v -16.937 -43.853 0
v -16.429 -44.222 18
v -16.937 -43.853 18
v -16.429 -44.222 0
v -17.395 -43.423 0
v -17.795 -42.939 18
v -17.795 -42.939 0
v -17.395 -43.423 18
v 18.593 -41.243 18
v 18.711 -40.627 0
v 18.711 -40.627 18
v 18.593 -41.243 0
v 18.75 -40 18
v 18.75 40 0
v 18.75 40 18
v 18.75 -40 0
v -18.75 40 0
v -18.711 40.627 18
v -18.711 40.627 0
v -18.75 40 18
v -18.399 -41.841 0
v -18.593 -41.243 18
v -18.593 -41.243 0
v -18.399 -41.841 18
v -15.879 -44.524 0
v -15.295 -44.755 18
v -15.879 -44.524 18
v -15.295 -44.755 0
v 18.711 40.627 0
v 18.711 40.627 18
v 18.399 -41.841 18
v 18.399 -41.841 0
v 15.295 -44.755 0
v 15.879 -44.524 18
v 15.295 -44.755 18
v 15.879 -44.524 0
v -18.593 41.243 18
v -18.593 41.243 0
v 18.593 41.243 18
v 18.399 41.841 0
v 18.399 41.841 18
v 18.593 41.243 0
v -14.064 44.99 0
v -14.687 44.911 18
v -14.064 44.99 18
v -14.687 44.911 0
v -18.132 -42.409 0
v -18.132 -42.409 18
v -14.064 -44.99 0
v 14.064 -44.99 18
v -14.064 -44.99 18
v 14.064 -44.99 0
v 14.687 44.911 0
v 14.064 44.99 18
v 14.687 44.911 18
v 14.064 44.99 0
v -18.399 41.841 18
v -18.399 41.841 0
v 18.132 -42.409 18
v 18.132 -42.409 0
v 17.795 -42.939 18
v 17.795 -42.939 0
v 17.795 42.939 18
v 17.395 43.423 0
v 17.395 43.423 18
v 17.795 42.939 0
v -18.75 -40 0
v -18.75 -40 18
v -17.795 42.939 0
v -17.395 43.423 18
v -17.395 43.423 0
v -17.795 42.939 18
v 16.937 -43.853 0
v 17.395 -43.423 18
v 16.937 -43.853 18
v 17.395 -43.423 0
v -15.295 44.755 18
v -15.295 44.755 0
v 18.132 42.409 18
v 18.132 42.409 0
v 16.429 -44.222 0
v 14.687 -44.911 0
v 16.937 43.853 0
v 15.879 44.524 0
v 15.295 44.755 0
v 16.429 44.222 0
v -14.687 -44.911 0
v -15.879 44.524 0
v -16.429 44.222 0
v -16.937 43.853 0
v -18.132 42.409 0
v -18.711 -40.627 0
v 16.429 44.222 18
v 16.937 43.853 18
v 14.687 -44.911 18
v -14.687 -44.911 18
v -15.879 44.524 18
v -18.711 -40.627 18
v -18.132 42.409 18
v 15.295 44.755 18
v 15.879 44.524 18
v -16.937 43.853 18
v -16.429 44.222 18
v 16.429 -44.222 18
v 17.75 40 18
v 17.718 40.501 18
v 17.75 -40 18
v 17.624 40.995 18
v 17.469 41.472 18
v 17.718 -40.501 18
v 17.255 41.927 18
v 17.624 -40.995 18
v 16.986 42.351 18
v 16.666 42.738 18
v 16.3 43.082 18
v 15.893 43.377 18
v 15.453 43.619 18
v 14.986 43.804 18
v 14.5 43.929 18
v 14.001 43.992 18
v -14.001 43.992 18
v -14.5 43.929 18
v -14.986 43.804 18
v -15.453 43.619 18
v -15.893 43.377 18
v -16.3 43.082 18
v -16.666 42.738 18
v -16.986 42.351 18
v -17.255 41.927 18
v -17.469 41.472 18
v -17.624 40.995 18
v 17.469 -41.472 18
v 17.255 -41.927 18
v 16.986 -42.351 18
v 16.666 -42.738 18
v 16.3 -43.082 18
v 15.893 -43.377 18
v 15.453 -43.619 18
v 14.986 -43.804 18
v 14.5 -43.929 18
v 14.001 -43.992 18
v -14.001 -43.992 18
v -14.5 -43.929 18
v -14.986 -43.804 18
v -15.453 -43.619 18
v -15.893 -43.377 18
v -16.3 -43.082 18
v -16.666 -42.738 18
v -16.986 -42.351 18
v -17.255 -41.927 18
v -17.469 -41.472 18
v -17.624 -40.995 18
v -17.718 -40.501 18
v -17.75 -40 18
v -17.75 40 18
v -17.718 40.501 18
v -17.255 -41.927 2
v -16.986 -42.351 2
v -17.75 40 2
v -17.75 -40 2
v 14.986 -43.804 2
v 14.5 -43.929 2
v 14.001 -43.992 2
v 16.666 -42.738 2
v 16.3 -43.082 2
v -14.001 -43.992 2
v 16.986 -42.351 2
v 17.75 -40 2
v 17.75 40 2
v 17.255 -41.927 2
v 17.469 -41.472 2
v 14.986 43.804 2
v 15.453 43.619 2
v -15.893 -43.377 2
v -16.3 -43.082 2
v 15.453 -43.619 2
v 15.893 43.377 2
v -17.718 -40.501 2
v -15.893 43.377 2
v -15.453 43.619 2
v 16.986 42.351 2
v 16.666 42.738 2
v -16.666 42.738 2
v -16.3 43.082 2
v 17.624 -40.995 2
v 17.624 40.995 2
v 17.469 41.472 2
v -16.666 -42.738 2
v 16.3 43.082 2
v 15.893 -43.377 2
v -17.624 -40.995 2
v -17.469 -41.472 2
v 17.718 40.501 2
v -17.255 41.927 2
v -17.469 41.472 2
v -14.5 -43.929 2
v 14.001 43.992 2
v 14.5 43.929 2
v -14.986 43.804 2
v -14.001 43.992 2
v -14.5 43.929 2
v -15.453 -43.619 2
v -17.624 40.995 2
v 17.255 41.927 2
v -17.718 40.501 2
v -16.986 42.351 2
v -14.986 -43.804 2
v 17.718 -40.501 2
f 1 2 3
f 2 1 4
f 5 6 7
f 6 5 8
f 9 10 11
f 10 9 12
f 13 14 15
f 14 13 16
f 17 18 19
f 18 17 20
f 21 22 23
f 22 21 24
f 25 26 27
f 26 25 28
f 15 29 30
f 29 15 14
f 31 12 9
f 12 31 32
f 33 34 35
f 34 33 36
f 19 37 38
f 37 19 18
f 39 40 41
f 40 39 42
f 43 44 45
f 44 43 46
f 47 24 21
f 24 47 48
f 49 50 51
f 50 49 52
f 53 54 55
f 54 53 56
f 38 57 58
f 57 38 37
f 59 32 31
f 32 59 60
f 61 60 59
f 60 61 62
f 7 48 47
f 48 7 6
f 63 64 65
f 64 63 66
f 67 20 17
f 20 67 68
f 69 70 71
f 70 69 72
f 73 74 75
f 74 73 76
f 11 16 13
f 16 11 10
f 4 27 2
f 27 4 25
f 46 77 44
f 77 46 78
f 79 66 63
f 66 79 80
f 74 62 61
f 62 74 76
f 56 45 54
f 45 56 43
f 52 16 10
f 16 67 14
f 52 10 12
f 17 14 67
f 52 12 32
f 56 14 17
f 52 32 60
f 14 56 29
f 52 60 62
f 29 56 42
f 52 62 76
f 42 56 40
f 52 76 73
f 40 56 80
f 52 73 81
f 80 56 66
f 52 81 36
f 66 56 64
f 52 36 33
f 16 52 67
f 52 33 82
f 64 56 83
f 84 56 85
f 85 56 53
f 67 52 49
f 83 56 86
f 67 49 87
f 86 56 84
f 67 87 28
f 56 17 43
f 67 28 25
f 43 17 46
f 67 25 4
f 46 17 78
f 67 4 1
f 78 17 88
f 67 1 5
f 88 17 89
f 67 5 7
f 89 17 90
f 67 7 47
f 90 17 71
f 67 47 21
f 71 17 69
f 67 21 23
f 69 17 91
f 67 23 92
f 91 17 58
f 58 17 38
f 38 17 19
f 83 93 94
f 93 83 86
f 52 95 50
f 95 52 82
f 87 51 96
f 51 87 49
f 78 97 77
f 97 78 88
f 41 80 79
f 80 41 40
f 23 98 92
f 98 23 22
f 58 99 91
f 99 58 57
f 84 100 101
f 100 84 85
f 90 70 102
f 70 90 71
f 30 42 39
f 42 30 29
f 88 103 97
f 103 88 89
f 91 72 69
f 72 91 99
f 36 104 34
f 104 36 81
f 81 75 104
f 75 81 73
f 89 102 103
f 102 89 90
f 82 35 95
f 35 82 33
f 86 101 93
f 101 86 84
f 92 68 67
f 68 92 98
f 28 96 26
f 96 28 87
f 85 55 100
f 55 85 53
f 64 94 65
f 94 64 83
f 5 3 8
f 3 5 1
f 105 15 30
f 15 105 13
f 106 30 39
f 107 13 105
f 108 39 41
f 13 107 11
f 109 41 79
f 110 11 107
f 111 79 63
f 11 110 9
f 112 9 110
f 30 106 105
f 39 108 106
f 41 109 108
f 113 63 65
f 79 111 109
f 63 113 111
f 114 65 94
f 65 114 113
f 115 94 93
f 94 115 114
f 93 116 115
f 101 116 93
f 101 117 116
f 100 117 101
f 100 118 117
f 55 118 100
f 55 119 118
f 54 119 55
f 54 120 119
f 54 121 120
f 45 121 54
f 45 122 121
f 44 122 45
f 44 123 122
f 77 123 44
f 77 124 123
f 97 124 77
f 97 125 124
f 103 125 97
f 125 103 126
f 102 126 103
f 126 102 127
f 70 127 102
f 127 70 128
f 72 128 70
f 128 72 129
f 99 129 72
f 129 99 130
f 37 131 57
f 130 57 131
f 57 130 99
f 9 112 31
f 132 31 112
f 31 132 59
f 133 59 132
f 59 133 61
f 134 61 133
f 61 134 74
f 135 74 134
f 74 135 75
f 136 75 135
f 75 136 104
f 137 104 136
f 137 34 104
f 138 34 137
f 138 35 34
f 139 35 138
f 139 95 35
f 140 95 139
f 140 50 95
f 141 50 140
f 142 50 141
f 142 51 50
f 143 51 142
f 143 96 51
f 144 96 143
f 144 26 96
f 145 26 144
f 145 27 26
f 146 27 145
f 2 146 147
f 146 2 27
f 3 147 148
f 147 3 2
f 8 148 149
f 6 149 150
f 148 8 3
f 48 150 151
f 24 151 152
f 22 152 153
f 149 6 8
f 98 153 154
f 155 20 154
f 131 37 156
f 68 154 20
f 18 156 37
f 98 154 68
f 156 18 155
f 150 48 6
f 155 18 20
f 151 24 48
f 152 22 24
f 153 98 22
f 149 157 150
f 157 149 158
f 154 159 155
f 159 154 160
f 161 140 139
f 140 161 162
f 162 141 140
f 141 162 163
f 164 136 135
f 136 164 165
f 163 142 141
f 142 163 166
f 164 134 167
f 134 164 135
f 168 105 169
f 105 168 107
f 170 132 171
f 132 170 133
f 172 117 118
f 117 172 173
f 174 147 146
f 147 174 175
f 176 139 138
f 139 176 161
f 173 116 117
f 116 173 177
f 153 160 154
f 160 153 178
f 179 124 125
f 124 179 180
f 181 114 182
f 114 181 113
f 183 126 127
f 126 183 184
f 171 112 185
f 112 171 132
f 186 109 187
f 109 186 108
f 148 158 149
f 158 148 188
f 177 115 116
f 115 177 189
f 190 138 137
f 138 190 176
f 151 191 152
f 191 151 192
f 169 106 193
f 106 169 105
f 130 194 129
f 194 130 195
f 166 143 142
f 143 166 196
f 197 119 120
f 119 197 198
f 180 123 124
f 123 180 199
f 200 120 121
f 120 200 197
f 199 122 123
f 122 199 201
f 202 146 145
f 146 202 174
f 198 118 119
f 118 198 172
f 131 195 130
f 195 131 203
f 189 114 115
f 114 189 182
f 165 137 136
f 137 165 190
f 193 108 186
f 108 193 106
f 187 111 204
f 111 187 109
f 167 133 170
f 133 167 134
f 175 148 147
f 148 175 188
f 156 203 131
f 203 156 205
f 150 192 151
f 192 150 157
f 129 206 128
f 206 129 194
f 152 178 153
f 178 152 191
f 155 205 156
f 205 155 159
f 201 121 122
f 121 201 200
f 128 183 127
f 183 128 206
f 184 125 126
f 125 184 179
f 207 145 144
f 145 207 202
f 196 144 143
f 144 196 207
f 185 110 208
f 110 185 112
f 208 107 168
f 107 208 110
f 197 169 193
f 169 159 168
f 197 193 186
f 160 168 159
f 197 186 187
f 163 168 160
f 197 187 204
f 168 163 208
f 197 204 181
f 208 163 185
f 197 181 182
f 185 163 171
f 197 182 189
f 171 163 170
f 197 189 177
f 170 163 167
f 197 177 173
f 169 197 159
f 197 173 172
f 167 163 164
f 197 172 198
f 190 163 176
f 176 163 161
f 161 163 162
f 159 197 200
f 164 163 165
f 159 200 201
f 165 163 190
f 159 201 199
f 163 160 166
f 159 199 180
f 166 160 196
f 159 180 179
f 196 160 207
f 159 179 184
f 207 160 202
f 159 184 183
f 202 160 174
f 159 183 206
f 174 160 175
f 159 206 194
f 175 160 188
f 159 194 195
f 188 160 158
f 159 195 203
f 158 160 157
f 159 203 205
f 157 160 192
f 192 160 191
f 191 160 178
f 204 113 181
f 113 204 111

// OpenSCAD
$fn = 50;


difference() {
	union() {
		hull() {
			translate(v = [-13.7500000000, 40.0000000000, 0]) {
				cylinder(h = 18, r = 5);
			}
			translate(v = [13.7500000000, 40.0000000000, 0]) {
				cylinder(h = 18, r = 5);
			}
			translate(v = [-13.7500000000, -40.0000000000, 0]) {
				cylinder(h = 18, r = 5);
			}
			translate(v = [13.7500000000, -40.0000000000, 0]) {
				cylinder(h = 18, r = 5);
			}
		}
	}
	union() {
		translate(v = [0, 0, 2]) {
			hull() {
				translate(v = [-13.7500000000, 40.0000000000, 0]) {
					cylinder(h = 16, r = 4);
				}
				translate(v = [13.7500000000, 40.0000000000, 0]) {
					cylinder(h = 16, r = 4);
				}
				translate(v = [-13.7500000000, -40.0000000000, 0]) {
					cylinder(h = 16, r = 4);
				}
				translate(v = [13.7500000000, -40.0000000000, 0]) {
					cylinder(h = 16, r = 4);
				}
			}
		}
	}
}
